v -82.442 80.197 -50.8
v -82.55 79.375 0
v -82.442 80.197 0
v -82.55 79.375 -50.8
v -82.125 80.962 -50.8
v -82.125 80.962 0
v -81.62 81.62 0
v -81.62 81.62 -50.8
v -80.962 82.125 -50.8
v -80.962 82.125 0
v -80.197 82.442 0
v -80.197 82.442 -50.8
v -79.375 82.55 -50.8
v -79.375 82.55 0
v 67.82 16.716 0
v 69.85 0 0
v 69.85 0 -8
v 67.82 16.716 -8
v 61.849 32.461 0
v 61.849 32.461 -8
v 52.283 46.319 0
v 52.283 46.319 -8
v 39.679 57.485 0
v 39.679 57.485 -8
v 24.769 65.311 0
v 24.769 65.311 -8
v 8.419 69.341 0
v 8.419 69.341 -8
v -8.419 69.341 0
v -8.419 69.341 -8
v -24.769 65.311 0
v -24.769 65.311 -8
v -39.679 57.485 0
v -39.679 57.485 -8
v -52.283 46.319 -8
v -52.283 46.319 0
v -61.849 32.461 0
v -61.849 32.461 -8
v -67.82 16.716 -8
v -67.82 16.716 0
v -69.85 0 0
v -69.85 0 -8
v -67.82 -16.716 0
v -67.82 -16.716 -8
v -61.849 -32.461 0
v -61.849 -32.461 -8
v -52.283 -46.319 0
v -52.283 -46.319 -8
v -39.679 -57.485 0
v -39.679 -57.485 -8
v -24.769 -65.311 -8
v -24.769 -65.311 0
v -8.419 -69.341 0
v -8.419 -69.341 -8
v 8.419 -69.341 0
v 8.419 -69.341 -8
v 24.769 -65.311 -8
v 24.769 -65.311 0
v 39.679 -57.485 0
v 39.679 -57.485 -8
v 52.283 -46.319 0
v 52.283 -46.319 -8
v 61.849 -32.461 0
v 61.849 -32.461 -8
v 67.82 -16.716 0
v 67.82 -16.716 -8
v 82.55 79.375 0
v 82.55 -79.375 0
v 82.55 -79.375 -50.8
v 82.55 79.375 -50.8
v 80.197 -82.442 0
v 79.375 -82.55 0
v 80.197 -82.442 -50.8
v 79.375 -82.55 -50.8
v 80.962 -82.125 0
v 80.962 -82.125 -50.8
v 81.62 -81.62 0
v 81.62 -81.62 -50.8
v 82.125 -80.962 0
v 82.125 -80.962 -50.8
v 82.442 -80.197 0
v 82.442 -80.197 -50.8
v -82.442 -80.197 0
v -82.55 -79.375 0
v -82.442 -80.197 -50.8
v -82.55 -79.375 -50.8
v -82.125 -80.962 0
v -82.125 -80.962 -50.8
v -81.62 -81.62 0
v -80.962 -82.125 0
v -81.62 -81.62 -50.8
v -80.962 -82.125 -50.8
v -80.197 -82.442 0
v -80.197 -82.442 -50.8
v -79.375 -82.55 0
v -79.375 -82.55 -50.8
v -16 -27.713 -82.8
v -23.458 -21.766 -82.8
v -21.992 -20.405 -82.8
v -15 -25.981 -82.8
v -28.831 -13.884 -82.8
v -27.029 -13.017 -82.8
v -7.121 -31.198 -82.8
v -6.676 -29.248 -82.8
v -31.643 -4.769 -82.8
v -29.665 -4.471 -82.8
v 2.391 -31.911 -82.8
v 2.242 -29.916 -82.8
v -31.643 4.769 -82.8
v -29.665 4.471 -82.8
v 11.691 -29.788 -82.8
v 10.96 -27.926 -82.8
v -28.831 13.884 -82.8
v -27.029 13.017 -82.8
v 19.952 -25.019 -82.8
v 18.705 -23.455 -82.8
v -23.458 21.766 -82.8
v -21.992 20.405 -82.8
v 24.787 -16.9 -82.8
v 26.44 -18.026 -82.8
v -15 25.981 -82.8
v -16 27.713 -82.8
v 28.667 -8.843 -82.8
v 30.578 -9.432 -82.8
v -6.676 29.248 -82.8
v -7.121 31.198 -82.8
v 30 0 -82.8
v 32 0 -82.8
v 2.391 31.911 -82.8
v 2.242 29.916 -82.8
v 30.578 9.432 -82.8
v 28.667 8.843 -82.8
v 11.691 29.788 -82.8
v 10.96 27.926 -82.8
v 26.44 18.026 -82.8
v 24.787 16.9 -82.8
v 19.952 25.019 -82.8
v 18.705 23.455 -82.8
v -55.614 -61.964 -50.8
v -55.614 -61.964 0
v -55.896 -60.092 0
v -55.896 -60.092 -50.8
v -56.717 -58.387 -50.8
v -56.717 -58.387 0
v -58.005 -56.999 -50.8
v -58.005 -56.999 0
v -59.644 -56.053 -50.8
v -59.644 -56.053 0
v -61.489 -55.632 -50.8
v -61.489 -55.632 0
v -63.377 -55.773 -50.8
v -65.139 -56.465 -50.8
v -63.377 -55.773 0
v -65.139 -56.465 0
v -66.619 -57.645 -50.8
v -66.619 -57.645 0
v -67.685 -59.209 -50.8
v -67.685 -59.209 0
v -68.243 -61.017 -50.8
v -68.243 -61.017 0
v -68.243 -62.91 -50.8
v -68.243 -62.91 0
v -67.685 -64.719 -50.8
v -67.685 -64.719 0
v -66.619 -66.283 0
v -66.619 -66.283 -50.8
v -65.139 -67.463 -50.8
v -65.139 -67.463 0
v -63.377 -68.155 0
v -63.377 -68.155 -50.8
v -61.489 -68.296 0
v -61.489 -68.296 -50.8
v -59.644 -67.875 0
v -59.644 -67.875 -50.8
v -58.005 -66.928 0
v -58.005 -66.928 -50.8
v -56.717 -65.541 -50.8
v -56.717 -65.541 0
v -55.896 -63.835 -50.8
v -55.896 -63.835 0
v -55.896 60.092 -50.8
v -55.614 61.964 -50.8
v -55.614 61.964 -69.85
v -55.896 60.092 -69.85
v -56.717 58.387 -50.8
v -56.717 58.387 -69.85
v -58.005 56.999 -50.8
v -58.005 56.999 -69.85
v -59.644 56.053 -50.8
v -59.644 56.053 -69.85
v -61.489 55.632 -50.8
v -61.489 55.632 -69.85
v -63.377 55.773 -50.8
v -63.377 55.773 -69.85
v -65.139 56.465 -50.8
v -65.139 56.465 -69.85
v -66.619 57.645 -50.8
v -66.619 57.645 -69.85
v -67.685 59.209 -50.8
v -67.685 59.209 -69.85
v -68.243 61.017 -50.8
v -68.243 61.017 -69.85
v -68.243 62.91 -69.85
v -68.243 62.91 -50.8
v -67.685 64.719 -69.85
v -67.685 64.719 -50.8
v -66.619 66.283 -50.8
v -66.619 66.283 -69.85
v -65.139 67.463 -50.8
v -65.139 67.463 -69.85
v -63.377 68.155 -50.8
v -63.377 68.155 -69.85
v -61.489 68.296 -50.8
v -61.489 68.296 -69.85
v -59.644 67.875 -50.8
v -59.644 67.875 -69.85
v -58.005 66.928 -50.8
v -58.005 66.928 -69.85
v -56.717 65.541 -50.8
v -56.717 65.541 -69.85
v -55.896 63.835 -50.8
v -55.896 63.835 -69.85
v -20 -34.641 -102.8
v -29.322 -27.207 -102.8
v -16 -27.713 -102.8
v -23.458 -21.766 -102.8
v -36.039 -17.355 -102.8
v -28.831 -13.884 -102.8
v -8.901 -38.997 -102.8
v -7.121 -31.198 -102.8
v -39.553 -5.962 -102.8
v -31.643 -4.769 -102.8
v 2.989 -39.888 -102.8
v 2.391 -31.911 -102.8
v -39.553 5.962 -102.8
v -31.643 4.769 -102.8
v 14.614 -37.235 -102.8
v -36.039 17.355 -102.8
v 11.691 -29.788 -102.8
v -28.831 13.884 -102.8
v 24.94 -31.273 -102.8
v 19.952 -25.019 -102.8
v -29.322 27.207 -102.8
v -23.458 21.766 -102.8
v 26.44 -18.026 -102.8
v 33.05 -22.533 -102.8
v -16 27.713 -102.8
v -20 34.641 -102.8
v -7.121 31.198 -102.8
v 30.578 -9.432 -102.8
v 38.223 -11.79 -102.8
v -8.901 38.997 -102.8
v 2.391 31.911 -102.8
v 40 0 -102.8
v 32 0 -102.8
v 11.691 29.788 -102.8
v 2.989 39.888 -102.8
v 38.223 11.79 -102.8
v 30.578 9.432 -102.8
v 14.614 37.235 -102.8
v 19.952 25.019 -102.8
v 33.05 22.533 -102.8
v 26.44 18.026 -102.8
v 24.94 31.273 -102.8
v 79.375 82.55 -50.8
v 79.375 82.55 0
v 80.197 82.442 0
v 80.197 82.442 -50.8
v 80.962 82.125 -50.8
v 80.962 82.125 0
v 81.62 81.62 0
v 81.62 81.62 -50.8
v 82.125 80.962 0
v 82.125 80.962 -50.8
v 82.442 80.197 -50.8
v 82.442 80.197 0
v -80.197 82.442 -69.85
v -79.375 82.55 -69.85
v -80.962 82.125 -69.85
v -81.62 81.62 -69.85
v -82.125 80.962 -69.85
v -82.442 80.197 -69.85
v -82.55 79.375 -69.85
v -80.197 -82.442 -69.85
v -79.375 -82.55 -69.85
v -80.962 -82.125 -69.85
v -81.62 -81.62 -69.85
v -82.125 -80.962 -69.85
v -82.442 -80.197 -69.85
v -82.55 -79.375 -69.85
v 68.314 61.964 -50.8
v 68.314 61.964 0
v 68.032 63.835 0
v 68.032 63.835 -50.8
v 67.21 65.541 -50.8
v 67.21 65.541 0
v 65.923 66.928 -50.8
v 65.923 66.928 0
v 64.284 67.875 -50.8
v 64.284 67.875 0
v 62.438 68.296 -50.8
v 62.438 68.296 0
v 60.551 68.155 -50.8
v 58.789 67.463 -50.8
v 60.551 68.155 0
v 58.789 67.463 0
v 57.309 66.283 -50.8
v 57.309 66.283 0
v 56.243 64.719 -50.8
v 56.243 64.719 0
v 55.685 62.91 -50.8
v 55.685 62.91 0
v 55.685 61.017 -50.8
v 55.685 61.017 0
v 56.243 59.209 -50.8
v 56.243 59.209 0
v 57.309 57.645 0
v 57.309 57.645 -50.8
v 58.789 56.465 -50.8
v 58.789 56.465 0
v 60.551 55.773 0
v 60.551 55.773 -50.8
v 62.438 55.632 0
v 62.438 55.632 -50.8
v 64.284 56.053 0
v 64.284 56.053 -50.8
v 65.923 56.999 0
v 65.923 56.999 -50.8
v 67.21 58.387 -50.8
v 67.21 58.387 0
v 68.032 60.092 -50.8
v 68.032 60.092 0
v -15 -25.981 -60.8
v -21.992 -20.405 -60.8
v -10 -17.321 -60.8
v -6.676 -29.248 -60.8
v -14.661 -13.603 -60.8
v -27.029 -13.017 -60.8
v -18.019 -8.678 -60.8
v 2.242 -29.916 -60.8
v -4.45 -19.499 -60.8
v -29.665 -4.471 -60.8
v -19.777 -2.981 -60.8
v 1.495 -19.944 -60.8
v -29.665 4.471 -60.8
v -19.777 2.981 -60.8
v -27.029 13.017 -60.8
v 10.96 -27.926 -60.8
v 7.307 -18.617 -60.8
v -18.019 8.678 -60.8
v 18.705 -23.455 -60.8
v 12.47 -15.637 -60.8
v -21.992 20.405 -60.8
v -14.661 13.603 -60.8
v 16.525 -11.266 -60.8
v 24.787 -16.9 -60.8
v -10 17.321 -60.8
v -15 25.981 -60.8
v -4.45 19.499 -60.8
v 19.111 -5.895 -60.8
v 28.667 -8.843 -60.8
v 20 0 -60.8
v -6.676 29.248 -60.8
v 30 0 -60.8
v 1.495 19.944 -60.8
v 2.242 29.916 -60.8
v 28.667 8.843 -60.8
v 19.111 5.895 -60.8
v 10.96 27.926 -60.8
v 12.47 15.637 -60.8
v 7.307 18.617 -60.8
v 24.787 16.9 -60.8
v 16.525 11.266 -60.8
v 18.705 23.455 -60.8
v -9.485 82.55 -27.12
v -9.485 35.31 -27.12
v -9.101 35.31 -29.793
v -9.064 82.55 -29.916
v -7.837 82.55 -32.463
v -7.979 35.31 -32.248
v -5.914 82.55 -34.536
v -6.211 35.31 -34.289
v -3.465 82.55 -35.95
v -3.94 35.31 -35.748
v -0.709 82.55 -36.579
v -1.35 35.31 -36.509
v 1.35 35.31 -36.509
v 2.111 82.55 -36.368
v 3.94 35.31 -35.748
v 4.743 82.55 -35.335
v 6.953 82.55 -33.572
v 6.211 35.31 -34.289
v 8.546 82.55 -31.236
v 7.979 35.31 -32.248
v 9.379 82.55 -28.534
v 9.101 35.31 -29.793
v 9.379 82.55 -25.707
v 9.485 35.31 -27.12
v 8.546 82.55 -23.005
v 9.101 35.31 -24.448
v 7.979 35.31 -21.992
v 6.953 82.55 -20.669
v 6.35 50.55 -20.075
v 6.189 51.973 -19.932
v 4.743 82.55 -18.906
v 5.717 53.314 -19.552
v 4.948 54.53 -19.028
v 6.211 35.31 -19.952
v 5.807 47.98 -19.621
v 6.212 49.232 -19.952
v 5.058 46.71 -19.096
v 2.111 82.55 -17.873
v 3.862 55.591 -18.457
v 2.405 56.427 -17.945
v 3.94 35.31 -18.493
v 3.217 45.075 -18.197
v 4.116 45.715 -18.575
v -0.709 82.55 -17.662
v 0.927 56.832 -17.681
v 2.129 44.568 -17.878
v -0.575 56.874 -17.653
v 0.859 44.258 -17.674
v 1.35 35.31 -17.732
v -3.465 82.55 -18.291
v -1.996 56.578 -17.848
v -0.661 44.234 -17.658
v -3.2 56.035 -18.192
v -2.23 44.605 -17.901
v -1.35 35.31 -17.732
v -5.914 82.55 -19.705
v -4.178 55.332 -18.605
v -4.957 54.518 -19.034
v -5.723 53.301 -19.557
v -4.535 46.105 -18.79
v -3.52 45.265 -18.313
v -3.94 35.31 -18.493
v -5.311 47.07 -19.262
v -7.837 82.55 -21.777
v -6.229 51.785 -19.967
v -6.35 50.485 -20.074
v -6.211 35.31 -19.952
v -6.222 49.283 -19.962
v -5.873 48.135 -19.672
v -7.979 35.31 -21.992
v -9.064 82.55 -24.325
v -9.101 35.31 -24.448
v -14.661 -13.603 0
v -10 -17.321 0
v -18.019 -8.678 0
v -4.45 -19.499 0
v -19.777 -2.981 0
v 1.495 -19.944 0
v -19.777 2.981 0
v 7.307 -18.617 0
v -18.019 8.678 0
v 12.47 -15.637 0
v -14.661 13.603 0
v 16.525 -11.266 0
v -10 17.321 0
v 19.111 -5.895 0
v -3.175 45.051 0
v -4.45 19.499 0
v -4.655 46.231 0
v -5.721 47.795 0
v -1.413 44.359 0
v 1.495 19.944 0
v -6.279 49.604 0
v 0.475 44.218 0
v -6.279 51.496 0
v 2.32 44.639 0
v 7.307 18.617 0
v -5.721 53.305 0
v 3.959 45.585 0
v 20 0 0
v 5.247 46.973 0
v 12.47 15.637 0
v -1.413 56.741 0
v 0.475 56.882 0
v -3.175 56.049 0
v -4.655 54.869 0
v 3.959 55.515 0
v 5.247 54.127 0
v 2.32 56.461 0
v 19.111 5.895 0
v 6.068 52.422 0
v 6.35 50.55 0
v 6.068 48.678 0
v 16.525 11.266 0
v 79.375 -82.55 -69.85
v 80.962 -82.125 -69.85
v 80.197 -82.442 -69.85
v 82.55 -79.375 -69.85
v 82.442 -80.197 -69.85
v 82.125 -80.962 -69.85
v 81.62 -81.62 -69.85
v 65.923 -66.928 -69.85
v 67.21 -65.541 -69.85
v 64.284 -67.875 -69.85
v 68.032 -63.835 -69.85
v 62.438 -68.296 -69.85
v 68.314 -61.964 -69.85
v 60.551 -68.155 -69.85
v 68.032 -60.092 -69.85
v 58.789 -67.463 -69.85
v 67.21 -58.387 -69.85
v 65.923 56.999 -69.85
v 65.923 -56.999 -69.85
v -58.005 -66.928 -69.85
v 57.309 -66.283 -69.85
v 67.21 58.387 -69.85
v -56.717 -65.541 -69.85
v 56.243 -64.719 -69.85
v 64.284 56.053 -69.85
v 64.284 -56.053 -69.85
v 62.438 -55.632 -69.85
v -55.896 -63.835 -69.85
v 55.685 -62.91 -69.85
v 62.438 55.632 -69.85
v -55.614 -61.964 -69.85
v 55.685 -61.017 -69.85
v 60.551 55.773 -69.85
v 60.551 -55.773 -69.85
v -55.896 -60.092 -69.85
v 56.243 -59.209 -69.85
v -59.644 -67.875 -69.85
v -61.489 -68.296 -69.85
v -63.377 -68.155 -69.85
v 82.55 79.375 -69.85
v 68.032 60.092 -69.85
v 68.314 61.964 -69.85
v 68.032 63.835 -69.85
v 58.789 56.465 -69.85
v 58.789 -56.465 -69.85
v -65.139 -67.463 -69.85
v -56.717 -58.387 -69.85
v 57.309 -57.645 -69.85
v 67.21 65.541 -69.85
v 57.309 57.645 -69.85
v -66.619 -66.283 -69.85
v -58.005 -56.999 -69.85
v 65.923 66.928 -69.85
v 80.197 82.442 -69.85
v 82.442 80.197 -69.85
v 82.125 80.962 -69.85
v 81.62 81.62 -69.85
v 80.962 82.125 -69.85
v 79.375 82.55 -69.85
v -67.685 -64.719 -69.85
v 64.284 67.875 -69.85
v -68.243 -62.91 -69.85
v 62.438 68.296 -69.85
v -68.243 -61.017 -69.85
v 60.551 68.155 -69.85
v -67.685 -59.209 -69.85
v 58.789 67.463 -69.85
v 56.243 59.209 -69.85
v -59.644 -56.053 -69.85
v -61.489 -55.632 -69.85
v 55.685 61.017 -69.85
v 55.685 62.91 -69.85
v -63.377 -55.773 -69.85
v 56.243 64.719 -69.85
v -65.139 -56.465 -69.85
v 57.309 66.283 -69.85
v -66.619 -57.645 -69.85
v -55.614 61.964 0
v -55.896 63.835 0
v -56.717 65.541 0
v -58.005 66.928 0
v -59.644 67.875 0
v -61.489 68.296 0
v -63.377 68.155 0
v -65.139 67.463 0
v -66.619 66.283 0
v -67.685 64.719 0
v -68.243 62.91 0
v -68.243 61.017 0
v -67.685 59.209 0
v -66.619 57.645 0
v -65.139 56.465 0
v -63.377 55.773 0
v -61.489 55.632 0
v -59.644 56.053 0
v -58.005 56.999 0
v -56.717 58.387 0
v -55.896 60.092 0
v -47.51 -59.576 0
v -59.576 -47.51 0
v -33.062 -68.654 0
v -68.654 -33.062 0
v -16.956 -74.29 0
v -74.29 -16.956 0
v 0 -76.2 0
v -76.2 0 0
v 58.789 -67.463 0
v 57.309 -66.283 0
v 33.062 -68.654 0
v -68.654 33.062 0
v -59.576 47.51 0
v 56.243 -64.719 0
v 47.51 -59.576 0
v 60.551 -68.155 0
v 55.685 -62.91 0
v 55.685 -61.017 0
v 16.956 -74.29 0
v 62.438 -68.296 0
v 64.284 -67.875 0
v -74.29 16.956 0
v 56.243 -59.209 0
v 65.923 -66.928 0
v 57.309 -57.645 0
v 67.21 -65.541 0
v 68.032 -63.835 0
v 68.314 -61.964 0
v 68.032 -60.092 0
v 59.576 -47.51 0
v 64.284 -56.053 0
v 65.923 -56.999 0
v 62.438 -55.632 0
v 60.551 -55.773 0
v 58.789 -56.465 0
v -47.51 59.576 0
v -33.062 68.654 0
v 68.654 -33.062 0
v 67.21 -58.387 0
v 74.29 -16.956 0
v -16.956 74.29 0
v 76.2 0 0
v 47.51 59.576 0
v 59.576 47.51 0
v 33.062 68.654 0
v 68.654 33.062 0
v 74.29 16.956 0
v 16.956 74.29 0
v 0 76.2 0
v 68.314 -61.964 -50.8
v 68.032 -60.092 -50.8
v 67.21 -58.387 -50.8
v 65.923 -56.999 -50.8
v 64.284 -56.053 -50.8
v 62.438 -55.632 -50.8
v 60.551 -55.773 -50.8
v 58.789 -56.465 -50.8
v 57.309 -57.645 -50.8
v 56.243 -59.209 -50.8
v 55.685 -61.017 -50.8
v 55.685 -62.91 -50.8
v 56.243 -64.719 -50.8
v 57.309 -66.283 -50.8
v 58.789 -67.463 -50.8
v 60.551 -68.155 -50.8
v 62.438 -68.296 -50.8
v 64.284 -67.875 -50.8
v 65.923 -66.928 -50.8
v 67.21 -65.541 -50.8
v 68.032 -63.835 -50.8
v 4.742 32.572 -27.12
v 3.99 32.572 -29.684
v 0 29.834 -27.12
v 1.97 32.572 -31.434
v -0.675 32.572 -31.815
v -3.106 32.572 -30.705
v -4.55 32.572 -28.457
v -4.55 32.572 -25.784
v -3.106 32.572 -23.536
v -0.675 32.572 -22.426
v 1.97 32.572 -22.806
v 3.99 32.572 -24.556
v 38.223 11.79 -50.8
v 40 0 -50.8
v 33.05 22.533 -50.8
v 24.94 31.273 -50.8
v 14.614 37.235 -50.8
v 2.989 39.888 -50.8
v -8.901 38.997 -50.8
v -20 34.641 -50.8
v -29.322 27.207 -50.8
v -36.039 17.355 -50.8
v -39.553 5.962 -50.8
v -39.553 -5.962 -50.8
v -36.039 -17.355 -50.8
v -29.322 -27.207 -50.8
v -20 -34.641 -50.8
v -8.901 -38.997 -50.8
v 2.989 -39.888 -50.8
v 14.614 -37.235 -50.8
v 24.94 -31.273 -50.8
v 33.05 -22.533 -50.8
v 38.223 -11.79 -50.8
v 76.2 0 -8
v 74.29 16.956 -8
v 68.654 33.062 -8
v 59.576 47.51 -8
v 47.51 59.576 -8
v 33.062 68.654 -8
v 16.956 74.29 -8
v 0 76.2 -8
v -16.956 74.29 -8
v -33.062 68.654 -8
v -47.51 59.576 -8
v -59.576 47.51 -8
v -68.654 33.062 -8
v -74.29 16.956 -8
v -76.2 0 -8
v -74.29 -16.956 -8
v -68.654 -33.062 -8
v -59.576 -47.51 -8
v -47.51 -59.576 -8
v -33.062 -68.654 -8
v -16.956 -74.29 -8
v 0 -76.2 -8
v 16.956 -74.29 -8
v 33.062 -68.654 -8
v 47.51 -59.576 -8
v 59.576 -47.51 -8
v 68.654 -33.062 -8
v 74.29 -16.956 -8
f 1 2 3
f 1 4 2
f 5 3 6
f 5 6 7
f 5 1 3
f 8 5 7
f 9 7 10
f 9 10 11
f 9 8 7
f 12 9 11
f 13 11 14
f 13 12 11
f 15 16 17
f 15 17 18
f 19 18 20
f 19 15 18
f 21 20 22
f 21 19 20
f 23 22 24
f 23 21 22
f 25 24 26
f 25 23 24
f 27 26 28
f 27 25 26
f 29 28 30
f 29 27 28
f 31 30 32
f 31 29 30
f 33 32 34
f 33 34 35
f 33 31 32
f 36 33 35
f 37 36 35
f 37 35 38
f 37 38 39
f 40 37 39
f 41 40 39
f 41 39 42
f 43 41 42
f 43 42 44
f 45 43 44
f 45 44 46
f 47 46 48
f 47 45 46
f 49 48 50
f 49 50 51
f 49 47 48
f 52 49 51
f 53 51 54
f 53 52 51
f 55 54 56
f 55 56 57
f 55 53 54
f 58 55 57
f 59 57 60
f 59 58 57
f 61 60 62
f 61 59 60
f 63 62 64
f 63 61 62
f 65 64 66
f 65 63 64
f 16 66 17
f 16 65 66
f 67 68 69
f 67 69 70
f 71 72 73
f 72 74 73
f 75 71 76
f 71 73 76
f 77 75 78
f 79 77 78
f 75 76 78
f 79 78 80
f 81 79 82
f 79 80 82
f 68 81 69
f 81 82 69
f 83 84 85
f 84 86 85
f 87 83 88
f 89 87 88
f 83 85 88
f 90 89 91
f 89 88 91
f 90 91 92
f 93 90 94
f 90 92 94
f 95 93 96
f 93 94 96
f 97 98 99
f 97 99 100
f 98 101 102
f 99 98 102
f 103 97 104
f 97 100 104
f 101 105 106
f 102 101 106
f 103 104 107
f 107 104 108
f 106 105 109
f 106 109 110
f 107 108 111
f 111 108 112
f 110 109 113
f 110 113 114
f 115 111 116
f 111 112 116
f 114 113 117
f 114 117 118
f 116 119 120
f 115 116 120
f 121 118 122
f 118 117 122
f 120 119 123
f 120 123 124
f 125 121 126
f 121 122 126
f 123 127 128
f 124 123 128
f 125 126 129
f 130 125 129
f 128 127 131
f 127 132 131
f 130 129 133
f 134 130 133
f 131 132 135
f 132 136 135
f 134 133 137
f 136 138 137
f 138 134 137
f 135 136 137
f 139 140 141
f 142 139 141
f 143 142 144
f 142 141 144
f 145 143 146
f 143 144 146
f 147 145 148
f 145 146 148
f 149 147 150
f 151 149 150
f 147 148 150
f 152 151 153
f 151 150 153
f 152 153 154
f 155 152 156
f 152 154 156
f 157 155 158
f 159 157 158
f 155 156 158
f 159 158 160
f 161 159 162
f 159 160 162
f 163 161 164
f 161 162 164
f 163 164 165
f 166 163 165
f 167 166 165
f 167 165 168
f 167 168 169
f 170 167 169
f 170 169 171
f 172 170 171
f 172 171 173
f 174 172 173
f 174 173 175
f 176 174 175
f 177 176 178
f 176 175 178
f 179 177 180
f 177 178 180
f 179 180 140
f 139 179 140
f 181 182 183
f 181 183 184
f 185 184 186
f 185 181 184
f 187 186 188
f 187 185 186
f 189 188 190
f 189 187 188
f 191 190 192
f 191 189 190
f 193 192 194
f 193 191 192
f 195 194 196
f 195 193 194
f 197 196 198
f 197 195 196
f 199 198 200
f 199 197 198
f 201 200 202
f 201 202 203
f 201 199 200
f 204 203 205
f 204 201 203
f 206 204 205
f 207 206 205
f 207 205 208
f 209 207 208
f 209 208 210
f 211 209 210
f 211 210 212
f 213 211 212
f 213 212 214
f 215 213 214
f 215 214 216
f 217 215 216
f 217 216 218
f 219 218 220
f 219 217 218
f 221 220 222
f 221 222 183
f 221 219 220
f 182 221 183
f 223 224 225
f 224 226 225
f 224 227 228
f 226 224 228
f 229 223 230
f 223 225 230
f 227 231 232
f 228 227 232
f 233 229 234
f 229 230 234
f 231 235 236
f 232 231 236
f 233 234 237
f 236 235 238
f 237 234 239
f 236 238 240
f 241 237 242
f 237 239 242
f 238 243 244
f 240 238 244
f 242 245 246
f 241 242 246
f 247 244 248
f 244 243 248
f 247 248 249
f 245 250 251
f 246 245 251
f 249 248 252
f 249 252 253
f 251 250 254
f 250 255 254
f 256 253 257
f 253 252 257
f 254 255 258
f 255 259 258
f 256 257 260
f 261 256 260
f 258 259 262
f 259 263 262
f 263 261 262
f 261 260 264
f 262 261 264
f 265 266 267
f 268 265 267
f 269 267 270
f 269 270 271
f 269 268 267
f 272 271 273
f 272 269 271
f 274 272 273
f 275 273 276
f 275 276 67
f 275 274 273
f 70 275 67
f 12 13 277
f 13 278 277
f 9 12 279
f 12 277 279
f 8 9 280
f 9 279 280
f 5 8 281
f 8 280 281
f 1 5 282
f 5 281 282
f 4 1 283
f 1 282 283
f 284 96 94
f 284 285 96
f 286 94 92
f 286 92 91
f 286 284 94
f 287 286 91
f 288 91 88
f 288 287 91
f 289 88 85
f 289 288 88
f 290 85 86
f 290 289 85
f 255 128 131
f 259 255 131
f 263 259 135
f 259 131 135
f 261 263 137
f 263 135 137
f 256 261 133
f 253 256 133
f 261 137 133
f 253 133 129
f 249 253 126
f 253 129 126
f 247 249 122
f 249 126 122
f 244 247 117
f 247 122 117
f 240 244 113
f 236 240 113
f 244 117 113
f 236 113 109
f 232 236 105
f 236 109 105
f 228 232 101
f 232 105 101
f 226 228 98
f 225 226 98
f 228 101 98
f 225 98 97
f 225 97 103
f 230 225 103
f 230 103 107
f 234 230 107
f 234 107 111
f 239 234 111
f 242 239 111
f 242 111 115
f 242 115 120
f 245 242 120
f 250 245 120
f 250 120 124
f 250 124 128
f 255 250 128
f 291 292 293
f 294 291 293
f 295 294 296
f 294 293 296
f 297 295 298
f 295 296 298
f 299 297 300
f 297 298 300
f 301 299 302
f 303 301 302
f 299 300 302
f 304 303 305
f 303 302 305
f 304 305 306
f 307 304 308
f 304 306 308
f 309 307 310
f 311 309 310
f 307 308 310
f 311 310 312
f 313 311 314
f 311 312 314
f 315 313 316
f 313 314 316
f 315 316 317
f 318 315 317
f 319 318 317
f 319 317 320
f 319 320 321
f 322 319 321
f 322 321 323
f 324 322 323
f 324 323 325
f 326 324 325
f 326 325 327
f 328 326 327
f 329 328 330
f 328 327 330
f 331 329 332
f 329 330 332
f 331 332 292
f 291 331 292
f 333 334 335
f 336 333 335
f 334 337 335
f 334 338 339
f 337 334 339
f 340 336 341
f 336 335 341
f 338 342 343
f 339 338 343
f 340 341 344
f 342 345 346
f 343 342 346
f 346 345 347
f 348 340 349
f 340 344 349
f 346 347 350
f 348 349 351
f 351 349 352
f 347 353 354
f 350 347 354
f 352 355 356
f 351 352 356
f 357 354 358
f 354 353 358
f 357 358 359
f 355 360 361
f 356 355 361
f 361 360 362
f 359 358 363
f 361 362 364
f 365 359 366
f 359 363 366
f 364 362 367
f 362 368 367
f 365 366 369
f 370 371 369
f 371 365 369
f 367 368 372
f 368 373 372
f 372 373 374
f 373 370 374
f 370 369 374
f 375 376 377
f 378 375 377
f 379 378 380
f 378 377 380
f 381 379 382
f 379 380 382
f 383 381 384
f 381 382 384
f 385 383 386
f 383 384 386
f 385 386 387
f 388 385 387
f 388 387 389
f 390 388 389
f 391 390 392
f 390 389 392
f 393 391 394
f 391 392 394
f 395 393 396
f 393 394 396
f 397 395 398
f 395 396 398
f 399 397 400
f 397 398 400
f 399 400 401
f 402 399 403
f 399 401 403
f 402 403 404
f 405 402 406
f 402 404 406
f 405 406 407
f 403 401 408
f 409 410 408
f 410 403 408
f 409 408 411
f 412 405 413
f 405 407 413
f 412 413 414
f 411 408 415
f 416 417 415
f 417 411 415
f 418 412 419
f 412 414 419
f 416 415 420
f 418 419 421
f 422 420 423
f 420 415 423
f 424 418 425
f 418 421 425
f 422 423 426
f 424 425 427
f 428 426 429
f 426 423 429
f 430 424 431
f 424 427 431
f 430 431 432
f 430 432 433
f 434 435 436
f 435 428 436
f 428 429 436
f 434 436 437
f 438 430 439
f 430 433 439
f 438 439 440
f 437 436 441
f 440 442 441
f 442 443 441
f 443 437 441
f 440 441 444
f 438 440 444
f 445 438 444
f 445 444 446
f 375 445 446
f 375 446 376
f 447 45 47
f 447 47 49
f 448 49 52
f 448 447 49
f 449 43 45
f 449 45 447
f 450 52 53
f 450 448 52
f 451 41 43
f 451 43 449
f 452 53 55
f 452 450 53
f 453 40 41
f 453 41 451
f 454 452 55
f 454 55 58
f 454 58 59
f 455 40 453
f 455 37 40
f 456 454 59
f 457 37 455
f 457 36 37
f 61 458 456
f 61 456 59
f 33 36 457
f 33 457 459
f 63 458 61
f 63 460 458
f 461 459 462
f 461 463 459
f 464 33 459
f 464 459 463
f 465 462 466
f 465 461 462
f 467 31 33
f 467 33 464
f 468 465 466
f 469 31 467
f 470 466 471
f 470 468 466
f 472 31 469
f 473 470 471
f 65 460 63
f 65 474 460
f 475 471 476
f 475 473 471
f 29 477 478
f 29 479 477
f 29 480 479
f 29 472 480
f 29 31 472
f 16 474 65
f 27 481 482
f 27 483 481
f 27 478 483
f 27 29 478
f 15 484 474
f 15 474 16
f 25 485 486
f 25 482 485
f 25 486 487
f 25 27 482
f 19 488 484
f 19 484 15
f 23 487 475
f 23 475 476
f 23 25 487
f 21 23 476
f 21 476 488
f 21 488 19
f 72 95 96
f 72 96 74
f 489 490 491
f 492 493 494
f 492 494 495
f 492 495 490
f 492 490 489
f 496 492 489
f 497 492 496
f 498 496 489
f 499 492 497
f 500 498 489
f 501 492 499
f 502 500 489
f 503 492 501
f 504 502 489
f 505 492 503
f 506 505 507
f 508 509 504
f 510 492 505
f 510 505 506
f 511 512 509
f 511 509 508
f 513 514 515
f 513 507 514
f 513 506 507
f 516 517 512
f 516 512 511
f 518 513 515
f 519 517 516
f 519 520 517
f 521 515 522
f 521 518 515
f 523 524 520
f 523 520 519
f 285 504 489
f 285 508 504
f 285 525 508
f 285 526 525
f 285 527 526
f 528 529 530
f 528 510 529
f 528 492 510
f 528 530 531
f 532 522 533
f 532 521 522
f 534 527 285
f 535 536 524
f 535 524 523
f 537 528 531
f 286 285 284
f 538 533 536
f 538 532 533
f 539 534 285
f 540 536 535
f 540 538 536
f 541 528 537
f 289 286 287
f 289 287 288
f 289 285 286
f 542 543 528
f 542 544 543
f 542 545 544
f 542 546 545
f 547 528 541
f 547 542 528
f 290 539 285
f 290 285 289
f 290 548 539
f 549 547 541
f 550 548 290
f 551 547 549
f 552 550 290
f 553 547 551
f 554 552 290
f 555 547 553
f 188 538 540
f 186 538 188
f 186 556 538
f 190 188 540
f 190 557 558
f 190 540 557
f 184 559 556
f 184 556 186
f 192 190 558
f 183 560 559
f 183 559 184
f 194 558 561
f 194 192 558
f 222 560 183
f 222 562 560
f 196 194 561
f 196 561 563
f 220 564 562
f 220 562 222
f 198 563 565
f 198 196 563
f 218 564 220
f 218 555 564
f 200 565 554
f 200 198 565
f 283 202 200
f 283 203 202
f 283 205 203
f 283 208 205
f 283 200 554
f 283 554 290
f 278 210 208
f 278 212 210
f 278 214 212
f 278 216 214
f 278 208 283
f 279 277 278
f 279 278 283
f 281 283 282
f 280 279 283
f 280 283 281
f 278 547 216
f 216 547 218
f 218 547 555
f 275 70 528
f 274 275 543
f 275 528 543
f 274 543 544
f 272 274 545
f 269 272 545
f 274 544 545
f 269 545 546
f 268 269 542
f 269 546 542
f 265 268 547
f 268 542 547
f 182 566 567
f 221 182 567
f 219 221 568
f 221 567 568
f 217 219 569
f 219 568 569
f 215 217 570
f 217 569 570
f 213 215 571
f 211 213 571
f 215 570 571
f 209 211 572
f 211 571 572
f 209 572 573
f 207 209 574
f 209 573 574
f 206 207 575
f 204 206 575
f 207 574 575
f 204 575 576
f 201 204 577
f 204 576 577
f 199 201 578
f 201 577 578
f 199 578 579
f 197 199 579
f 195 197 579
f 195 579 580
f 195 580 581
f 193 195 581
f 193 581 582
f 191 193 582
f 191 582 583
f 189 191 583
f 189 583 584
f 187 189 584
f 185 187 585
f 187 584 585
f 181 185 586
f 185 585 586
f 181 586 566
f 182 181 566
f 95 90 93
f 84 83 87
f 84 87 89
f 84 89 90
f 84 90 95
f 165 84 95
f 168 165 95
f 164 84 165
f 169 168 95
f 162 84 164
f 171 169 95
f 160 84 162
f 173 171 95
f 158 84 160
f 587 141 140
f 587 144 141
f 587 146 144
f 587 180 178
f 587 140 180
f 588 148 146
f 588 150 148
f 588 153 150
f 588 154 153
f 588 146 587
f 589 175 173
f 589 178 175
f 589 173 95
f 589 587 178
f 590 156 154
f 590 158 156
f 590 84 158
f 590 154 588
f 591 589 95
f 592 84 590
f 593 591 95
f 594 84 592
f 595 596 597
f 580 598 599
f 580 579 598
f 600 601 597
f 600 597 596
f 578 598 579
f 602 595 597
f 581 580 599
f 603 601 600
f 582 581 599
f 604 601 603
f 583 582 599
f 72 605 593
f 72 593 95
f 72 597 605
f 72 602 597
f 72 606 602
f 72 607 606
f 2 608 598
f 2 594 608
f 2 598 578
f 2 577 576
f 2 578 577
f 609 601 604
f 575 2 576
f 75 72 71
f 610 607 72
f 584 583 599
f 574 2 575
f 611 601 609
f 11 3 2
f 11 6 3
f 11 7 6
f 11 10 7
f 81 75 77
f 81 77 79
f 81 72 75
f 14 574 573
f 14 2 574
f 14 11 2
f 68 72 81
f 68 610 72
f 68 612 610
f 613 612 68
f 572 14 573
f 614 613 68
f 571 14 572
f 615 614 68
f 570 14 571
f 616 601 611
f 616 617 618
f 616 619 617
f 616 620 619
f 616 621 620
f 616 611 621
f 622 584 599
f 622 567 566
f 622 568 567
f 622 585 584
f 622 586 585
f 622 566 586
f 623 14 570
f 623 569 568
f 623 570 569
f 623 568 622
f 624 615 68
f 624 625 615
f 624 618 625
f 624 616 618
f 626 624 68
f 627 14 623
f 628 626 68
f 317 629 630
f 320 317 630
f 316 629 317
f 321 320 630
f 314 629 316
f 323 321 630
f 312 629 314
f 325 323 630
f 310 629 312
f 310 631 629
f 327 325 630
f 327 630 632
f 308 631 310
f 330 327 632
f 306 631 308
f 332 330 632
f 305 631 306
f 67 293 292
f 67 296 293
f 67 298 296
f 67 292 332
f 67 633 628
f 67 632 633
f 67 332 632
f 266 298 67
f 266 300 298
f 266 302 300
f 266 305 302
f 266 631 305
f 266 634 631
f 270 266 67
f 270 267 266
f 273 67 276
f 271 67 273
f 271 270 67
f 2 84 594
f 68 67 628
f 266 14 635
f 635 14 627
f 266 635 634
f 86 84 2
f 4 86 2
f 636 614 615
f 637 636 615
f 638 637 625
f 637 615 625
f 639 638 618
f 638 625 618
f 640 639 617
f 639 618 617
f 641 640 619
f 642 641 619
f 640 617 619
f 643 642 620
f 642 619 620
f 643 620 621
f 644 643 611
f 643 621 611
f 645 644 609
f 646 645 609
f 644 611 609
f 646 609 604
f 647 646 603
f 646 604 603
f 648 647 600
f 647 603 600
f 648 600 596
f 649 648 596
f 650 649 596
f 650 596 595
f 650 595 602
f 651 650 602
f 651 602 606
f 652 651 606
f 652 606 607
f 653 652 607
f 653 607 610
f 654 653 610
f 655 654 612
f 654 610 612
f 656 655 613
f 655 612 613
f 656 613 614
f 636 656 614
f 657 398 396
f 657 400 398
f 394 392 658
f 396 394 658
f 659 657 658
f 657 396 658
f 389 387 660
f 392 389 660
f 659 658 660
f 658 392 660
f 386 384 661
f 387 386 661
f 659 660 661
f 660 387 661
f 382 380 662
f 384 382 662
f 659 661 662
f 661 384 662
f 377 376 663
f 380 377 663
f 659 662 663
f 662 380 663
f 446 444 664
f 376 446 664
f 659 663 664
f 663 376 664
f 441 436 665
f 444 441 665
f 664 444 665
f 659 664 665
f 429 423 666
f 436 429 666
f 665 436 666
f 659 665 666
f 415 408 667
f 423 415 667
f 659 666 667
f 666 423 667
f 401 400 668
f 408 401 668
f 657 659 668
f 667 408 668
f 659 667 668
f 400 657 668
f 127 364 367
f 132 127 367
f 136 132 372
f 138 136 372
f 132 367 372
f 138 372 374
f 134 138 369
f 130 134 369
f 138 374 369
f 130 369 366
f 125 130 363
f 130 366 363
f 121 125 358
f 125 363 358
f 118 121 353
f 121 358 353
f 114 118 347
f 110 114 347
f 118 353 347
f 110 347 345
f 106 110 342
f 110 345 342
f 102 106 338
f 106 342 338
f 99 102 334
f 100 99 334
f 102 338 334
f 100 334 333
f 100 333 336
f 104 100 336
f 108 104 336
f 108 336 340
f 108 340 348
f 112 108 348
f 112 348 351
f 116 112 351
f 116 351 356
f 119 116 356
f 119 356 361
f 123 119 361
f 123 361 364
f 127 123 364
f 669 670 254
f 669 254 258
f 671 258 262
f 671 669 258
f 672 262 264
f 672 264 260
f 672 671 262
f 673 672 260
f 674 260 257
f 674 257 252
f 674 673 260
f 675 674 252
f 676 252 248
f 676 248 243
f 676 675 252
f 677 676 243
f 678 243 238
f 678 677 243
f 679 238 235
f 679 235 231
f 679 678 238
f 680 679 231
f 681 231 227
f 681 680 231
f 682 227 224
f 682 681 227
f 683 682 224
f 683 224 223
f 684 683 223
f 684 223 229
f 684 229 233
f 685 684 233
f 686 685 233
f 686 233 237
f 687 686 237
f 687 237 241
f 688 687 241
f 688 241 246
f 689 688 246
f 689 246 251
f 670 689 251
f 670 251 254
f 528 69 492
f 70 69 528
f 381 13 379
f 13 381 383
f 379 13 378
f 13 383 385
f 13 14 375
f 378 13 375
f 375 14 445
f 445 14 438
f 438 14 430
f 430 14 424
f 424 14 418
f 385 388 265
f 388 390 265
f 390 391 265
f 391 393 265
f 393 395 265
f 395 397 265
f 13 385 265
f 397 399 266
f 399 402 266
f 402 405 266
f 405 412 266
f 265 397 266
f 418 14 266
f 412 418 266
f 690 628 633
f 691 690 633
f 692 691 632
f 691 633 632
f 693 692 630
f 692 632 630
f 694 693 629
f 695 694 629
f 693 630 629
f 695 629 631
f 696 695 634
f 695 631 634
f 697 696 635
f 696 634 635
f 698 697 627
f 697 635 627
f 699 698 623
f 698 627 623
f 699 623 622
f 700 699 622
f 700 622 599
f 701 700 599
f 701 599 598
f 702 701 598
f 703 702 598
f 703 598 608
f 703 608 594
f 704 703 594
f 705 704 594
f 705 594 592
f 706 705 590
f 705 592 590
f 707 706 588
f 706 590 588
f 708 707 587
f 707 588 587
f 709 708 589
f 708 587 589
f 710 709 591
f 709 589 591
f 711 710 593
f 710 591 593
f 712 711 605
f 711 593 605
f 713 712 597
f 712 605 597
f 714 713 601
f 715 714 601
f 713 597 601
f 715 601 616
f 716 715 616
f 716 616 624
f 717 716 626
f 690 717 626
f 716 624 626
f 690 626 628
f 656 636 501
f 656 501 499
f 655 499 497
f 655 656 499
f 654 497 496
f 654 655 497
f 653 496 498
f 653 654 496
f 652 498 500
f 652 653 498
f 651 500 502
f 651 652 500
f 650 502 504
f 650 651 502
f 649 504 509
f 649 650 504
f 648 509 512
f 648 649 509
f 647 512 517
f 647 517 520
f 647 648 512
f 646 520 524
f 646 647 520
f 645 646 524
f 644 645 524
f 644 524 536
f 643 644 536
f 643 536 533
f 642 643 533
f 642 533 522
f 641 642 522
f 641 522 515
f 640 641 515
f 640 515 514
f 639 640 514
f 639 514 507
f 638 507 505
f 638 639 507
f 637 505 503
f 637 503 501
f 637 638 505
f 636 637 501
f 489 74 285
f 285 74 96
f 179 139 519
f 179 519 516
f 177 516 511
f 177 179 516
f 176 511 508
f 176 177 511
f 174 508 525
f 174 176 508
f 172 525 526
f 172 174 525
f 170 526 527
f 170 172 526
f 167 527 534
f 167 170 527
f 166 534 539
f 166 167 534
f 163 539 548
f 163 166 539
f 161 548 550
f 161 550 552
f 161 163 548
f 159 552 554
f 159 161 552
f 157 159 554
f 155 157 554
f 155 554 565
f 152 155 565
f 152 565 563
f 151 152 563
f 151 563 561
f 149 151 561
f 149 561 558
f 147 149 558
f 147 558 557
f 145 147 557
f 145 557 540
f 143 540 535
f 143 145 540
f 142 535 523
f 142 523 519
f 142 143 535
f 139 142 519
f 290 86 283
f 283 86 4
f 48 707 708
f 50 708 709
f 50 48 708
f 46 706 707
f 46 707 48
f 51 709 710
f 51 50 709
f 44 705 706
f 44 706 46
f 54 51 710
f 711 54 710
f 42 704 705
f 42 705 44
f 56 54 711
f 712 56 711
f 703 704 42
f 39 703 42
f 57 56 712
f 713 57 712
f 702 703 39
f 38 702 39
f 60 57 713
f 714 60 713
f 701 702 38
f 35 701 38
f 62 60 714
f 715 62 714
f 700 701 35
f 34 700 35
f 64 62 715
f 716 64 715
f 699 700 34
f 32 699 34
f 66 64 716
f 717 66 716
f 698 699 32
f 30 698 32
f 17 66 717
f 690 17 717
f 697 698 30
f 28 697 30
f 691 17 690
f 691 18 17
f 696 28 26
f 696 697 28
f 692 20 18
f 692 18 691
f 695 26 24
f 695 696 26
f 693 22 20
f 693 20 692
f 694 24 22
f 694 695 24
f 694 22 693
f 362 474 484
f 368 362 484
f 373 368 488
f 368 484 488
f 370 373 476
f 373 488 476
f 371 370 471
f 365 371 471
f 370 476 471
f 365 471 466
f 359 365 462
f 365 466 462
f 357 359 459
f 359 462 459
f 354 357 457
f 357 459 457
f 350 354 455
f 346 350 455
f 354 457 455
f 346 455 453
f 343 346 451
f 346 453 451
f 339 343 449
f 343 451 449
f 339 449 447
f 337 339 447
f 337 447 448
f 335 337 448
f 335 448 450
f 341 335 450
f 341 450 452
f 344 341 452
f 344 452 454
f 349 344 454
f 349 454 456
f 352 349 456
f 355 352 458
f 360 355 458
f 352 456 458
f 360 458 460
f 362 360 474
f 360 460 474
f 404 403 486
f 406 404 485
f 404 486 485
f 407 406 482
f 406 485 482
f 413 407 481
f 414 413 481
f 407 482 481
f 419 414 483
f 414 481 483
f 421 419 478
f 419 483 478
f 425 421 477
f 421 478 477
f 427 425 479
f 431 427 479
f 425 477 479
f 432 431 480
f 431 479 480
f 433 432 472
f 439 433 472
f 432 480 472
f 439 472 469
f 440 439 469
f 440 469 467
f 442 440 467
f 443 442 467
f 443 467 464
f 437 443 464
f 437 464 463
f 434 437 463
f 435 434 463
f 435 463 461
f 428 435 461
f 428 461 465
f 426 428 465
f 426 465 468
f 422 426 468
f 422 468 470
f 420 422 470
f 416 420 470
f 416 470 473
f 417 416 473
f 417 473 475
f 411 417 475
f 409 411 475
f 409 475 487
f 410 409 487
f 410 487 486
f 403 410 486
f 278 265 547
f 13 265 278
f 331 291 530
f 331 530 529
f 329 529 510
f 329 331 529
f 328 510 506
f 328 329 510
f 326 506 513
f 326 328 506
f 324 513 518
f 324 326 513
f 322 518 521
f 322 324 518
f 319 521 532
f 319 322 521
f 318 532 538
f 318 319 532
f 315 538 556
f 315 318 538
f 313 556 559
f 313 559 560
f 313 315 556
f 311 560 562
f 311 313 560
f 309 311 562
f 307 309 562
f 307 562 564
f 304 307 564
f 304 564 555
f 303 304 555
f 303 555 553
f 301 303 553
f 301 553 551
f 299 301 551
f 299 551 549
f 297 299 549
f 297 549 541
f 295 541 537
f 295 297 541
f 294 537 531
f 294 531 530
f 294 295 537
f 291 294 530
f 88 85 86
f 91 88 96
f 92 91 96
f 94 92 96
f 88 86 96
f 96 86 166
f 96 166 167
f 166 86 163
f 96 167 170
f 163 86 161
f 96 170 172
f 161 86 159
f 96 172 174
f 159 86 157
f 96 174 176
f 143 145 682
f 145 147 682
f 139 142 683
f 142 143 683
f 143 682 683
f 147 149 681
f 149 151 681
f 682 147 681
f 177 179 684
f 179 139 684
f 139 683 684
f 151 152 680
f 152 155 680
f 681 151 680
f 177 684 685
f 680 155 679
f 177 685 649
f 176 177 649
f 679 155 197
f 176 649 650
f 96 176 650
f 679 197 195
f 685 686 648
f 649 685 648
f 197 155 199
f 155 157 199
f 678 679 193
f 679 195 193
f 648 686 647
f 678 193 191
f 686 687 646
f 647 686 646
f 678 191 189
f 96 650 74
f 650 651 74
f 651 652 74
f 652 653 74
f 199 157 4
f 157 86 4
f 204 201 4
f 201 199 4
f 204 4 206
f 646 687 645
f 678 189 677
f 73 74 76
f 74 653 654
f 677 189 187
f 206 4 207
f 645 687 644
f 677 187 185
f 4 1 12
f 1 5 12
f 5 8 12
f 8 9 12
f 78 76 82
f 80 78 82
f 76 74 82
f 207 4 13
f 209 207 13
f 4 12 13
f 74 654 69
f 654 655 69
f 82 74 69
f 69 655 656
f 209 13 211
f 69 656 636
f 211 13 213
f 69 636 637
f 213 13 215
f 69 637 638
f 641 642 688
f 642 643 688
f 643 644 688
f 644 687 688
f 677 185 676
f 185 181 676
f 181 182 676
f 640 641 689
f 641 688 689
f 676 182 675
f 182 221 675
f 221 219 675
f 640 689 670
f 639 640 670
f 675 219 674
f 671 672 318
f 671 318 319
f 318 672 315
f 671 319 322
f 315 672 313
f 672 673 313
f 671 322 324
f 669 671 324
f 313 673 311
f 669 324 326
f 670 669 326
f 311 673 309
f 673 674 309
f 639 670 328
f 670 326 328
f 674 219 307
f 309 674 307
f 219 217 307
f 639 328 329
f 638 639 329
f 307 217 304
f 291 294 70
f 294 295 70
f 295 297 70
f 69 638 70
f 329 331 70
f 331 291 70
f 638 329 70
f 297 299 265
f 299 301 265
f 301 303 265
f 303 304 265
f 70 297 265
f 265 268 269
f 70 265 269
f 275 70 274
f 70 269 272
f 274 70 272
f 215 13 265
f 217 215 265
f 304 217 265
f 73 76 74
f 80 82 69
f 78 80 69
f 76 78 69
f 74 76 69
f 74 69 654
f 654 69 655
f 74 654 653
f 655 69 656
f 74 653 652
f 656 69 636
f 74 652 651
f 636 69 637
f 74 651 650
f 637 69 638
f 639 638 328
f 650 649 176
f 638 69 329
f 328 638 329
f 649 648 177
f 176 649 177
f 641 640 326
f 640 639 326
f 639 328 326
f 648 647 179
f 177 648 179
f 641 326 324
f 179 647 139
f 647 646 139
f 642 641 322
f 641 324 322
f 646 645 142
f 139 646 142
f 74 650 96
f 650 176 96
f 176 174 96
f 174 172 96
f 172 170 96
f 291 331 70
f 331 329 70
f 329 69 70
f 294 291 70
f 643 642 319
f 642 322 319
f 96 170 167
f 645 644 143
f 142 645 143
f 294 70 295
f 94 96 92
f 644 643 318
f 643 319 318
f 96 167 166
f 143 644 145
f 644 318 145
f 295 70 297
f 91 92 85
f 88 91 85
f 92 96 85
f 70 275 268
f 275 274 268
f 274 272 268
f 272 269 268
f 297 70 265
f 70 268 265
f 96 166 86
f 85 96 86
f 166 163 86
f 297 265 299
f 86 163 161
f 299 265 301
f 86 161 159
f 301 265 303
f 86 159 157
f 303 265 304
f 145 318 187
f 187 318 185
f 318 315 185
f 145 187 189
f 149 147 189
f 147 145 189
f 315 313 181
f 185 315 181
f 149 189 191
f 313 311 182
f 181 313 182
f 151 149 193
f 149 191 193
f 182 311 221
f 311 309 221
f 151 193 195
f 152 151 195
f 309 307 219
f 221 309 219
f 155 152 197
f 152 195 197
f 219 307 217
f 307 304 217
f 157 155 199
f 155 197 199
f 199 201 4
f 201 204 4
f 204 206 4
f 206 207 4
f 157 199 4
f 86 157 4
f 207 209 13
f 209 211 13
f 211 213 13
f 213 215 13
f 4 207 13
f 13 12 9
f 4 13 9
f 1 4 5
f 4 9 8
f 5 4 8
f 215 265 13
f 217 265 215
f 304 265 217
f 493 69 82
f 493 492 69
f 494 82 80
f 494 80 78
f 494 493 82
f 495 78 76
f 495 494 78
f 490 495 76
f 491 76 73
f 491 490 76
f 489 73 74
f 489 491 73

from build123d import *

# Parameters (mm, degrees)
SKETCH1_R                  = 40
SKETCH1_R_2                = 32
BOSS_EXTRUDE1_DEPTH        = 102.8
SKETCH1_3_R                = 32
SKETCH1_3_R_2              = 30
BOSS_EXTRUDE2_DEPTH        = 82.8
SKETCH1_4_R                = 30
SKETCH1_4_R_2              = 20
BOSS_EXTRUDE3_DEPTH        = 60.8
SKETCH1_5_W                = 165.1
SKETCH1_5_H                = 165.1
SKETCH1_5_R                = 6.35
SKETCH1_5_R_2              = 40
BOSS_EXTRUDE4_DEPTH        = 50.8
SKETCH2_R                  = 76.2
SKETCH2_R_2                = 69.85
CUT_EXTRUDE1_DEPTH         = 8
F_1_0MM_DOWEL_HOLE1_D      = 18.97
F_1_0MM_DOWEL_HOLE1_DEPTH  = 47.24
F_1_0MM_DOWEL_HOLE1_TIP    = 5.476167303
F_1_5MM_DOWEL_HOLE1_REACH  = 157.553
F_1_5MM_DOWEL_HOLE1_BORE_R = 6.35
SKETCH8_W                  = 165.1
SKETCH8_H                  = 165.1
SKETCH8_R                  = 6.35
BOSS_EXTRUDE5_DEPTH        = 19.05
FILLET1_R                  = 3.175
FILLET2_R                  = 3.175


with BuildPart() as part:
    # Sketch1 → Boss-Extrude1 (new body)
    with BuildSketch(Plane.XY):
        Circle(SKETCH1_R)
        Circle(SKETCH1_R_2, mode=Mode.SUBTRACT)
    extrude(amount=-BOSS_EXTRUDE1_DEPTH)

    # Sketch1<3> → Boss-Extrude2 (add)
    with BuildSketch(Plane.XY):
        Circle(SKETCH1_3_R)
        Circle(SKETCH1_3_R_2, mode=Mode.SUBTRACT)
    extrude(amount=-BOSS_EXTRUDE2_DEPTH)

    # Sketch1<4> → Boss-Extrude3 (add)
    with BuildSketch(Plane.XY):
        Circle(SKETCH1_4_R)
        Circle(SKETCH1_4_R_2, mode=Mode.SUBTRACT)
    extrude(amount=-BOSS_EXTRUDE3_DEPTH)

    # Sketch1<5> → Boss-Extrude4 (add)
    with BuildSketch(Plane.XY):
        Rectangle(SKETCH1_5_W, SKETCH1_5_H)
        with Locations((-61.963767235, -61.963767235)):
            Circle(SKETCH1_5_R, mode=Mode.SUBTRACT)
        with Locations((61.963767235, -61.963767235)):
            Circle(SKETCH1_5_R, mode=Mode.SUBTRACT)
        with Locations((61.963767235, 61.963767235)):
            Circle(SKETCH1_5_R, mode=Mode.SUBTRACT)
        with Locations((-61.963767235, 61.963767235)):
            Circle(SKETCH1_5_R, mode=Mode.SUBTRACT)
        Circle(SKETCH1_5_R_2, mode=Mode.SUBTRACT)
    extrude(amount=-BOSS_EXTRUDE4_DEPTH)

    # Sketch2 → Cut-Extrude1 (cut)
    with BuildSketch(Plane.XY):
        Circle(SKETCH2_R)
        Circle(SKETCH2_R_2, mode=Mode.SUBTRACT)
    extrude(amount=-CUT_EXTRUDE1_DEPTH, mode=Mode.SUBTRACT)

    # Ø1.0mm Dowel Hole1
    with Locations(Plane(origin=(0, 82.55, 0), x_dir=(1, 0, 0), z_dir=(0, 1, 0))):
        with Locations((0, 27.120400039)):
            Hole(F_1_0MM_DOWEL_HOLE1_D / 2, depth=F_1_0MM_DOWEL_HOLE1_DEPTH)
            with Locations((0, 0, -(F_1_0MM_DOWEL_HOLE1_DEPTH + F_1_0MM_DOWEL_HOLE1_TIP / 2))):  # 120° drill point
                Cone(0, F_1_0MM_DOWEL_HOLE1_D / 2, F_1_0MM_DOWEL_HOLE1_TIP, mode=Mode.SUBTRACT)

    # Ø1.5mm Dowel Hole1 bore → Ø1.5mm Dowel Hole1 (cut, up to next)
    with BuildSketch(Plane.XY, mode=Mode.PRIVATE) as f_1_5mm_dowel_hole1_sk1:
        with Locations((0, 50.55)):
            Circle(F_1_5MM_DOWEL_HOLE1_BORE_R)
    f_1_5mm_dowel_hole1_tool1 = extrude(f_1_5mm_dowel_hole1_sk1.sketch, amount=-F_1_5MM_DOWEL_HOLE1_REACH, mode=Mode.PRIVATE) & part.part
    add(f_1_5mm_dowel_hole1_tool1.solids().sort_by_distance((0, 50.55, 0))[0], mode=Mode.SUBTRACT)

    # Fillet1
    fillet1_edges = [part.edges().sort_by_distance(p)[0] for p in [
        (82.55, 82.55, -25.4),
        (82.55, -82.55, -25.4),
        (-82.55, -82.55, -25.4),
        (-82.55, 82.55, -25.4),
    ]]
    fillet(fillet1_edges, radius=FILLET1_R)


with BuildPart() as body_2:
    # Sketch8 → Boss-Extrude5 (new body)
    with BuildSketch(Plane(origin=(0, 0, -50.8), x_dir=(-1, 0, 0), z_dir=(0, 0, -1))):
        Rectangle(SKETCH8_W, SKETCH8_H)
        with Locations(Location((61.963767235, -61.963767235, 0), (0, 0, 180))):
            Circle(SKETCH8_R, mode=Mode.SUBTRACT)
        with Locations(Location((-61.963767235, -61.963767235, 0), (0, 0, 180))):
            Circle(SKETCH8_R, mode=Mode.SUBTRACT)
        with Locations(Location((-61.963767235, 61.963767235, 0), (0, 0, 180))):
            Circle(SKETCH8_R, mode=Mode.SUBTRACT)
        with Locations(Location((61.963767235, 61.963767235, 0), (0, 0, 180))):
            Circle(SKETCH8_R, mode=Mode.SUBTRACT)
    extrude(amount=BOSS_EXTRUDE5_DEPTH)

    # Fillet2
    fillet2_edges = [body_2.edges().sort_by_distance(p)[0] for p in [
        (-82.55, 82.55, -60.325),
        (-82.55, -82.55, -60.325),
        (82.55, -82.55, -60.325),
        (82.55, 82.55, -60.325),
    ]]
    fillet(fillet2_edges, radius=FILLET2_R)


solid = Compound([part.part, body_2.part])
